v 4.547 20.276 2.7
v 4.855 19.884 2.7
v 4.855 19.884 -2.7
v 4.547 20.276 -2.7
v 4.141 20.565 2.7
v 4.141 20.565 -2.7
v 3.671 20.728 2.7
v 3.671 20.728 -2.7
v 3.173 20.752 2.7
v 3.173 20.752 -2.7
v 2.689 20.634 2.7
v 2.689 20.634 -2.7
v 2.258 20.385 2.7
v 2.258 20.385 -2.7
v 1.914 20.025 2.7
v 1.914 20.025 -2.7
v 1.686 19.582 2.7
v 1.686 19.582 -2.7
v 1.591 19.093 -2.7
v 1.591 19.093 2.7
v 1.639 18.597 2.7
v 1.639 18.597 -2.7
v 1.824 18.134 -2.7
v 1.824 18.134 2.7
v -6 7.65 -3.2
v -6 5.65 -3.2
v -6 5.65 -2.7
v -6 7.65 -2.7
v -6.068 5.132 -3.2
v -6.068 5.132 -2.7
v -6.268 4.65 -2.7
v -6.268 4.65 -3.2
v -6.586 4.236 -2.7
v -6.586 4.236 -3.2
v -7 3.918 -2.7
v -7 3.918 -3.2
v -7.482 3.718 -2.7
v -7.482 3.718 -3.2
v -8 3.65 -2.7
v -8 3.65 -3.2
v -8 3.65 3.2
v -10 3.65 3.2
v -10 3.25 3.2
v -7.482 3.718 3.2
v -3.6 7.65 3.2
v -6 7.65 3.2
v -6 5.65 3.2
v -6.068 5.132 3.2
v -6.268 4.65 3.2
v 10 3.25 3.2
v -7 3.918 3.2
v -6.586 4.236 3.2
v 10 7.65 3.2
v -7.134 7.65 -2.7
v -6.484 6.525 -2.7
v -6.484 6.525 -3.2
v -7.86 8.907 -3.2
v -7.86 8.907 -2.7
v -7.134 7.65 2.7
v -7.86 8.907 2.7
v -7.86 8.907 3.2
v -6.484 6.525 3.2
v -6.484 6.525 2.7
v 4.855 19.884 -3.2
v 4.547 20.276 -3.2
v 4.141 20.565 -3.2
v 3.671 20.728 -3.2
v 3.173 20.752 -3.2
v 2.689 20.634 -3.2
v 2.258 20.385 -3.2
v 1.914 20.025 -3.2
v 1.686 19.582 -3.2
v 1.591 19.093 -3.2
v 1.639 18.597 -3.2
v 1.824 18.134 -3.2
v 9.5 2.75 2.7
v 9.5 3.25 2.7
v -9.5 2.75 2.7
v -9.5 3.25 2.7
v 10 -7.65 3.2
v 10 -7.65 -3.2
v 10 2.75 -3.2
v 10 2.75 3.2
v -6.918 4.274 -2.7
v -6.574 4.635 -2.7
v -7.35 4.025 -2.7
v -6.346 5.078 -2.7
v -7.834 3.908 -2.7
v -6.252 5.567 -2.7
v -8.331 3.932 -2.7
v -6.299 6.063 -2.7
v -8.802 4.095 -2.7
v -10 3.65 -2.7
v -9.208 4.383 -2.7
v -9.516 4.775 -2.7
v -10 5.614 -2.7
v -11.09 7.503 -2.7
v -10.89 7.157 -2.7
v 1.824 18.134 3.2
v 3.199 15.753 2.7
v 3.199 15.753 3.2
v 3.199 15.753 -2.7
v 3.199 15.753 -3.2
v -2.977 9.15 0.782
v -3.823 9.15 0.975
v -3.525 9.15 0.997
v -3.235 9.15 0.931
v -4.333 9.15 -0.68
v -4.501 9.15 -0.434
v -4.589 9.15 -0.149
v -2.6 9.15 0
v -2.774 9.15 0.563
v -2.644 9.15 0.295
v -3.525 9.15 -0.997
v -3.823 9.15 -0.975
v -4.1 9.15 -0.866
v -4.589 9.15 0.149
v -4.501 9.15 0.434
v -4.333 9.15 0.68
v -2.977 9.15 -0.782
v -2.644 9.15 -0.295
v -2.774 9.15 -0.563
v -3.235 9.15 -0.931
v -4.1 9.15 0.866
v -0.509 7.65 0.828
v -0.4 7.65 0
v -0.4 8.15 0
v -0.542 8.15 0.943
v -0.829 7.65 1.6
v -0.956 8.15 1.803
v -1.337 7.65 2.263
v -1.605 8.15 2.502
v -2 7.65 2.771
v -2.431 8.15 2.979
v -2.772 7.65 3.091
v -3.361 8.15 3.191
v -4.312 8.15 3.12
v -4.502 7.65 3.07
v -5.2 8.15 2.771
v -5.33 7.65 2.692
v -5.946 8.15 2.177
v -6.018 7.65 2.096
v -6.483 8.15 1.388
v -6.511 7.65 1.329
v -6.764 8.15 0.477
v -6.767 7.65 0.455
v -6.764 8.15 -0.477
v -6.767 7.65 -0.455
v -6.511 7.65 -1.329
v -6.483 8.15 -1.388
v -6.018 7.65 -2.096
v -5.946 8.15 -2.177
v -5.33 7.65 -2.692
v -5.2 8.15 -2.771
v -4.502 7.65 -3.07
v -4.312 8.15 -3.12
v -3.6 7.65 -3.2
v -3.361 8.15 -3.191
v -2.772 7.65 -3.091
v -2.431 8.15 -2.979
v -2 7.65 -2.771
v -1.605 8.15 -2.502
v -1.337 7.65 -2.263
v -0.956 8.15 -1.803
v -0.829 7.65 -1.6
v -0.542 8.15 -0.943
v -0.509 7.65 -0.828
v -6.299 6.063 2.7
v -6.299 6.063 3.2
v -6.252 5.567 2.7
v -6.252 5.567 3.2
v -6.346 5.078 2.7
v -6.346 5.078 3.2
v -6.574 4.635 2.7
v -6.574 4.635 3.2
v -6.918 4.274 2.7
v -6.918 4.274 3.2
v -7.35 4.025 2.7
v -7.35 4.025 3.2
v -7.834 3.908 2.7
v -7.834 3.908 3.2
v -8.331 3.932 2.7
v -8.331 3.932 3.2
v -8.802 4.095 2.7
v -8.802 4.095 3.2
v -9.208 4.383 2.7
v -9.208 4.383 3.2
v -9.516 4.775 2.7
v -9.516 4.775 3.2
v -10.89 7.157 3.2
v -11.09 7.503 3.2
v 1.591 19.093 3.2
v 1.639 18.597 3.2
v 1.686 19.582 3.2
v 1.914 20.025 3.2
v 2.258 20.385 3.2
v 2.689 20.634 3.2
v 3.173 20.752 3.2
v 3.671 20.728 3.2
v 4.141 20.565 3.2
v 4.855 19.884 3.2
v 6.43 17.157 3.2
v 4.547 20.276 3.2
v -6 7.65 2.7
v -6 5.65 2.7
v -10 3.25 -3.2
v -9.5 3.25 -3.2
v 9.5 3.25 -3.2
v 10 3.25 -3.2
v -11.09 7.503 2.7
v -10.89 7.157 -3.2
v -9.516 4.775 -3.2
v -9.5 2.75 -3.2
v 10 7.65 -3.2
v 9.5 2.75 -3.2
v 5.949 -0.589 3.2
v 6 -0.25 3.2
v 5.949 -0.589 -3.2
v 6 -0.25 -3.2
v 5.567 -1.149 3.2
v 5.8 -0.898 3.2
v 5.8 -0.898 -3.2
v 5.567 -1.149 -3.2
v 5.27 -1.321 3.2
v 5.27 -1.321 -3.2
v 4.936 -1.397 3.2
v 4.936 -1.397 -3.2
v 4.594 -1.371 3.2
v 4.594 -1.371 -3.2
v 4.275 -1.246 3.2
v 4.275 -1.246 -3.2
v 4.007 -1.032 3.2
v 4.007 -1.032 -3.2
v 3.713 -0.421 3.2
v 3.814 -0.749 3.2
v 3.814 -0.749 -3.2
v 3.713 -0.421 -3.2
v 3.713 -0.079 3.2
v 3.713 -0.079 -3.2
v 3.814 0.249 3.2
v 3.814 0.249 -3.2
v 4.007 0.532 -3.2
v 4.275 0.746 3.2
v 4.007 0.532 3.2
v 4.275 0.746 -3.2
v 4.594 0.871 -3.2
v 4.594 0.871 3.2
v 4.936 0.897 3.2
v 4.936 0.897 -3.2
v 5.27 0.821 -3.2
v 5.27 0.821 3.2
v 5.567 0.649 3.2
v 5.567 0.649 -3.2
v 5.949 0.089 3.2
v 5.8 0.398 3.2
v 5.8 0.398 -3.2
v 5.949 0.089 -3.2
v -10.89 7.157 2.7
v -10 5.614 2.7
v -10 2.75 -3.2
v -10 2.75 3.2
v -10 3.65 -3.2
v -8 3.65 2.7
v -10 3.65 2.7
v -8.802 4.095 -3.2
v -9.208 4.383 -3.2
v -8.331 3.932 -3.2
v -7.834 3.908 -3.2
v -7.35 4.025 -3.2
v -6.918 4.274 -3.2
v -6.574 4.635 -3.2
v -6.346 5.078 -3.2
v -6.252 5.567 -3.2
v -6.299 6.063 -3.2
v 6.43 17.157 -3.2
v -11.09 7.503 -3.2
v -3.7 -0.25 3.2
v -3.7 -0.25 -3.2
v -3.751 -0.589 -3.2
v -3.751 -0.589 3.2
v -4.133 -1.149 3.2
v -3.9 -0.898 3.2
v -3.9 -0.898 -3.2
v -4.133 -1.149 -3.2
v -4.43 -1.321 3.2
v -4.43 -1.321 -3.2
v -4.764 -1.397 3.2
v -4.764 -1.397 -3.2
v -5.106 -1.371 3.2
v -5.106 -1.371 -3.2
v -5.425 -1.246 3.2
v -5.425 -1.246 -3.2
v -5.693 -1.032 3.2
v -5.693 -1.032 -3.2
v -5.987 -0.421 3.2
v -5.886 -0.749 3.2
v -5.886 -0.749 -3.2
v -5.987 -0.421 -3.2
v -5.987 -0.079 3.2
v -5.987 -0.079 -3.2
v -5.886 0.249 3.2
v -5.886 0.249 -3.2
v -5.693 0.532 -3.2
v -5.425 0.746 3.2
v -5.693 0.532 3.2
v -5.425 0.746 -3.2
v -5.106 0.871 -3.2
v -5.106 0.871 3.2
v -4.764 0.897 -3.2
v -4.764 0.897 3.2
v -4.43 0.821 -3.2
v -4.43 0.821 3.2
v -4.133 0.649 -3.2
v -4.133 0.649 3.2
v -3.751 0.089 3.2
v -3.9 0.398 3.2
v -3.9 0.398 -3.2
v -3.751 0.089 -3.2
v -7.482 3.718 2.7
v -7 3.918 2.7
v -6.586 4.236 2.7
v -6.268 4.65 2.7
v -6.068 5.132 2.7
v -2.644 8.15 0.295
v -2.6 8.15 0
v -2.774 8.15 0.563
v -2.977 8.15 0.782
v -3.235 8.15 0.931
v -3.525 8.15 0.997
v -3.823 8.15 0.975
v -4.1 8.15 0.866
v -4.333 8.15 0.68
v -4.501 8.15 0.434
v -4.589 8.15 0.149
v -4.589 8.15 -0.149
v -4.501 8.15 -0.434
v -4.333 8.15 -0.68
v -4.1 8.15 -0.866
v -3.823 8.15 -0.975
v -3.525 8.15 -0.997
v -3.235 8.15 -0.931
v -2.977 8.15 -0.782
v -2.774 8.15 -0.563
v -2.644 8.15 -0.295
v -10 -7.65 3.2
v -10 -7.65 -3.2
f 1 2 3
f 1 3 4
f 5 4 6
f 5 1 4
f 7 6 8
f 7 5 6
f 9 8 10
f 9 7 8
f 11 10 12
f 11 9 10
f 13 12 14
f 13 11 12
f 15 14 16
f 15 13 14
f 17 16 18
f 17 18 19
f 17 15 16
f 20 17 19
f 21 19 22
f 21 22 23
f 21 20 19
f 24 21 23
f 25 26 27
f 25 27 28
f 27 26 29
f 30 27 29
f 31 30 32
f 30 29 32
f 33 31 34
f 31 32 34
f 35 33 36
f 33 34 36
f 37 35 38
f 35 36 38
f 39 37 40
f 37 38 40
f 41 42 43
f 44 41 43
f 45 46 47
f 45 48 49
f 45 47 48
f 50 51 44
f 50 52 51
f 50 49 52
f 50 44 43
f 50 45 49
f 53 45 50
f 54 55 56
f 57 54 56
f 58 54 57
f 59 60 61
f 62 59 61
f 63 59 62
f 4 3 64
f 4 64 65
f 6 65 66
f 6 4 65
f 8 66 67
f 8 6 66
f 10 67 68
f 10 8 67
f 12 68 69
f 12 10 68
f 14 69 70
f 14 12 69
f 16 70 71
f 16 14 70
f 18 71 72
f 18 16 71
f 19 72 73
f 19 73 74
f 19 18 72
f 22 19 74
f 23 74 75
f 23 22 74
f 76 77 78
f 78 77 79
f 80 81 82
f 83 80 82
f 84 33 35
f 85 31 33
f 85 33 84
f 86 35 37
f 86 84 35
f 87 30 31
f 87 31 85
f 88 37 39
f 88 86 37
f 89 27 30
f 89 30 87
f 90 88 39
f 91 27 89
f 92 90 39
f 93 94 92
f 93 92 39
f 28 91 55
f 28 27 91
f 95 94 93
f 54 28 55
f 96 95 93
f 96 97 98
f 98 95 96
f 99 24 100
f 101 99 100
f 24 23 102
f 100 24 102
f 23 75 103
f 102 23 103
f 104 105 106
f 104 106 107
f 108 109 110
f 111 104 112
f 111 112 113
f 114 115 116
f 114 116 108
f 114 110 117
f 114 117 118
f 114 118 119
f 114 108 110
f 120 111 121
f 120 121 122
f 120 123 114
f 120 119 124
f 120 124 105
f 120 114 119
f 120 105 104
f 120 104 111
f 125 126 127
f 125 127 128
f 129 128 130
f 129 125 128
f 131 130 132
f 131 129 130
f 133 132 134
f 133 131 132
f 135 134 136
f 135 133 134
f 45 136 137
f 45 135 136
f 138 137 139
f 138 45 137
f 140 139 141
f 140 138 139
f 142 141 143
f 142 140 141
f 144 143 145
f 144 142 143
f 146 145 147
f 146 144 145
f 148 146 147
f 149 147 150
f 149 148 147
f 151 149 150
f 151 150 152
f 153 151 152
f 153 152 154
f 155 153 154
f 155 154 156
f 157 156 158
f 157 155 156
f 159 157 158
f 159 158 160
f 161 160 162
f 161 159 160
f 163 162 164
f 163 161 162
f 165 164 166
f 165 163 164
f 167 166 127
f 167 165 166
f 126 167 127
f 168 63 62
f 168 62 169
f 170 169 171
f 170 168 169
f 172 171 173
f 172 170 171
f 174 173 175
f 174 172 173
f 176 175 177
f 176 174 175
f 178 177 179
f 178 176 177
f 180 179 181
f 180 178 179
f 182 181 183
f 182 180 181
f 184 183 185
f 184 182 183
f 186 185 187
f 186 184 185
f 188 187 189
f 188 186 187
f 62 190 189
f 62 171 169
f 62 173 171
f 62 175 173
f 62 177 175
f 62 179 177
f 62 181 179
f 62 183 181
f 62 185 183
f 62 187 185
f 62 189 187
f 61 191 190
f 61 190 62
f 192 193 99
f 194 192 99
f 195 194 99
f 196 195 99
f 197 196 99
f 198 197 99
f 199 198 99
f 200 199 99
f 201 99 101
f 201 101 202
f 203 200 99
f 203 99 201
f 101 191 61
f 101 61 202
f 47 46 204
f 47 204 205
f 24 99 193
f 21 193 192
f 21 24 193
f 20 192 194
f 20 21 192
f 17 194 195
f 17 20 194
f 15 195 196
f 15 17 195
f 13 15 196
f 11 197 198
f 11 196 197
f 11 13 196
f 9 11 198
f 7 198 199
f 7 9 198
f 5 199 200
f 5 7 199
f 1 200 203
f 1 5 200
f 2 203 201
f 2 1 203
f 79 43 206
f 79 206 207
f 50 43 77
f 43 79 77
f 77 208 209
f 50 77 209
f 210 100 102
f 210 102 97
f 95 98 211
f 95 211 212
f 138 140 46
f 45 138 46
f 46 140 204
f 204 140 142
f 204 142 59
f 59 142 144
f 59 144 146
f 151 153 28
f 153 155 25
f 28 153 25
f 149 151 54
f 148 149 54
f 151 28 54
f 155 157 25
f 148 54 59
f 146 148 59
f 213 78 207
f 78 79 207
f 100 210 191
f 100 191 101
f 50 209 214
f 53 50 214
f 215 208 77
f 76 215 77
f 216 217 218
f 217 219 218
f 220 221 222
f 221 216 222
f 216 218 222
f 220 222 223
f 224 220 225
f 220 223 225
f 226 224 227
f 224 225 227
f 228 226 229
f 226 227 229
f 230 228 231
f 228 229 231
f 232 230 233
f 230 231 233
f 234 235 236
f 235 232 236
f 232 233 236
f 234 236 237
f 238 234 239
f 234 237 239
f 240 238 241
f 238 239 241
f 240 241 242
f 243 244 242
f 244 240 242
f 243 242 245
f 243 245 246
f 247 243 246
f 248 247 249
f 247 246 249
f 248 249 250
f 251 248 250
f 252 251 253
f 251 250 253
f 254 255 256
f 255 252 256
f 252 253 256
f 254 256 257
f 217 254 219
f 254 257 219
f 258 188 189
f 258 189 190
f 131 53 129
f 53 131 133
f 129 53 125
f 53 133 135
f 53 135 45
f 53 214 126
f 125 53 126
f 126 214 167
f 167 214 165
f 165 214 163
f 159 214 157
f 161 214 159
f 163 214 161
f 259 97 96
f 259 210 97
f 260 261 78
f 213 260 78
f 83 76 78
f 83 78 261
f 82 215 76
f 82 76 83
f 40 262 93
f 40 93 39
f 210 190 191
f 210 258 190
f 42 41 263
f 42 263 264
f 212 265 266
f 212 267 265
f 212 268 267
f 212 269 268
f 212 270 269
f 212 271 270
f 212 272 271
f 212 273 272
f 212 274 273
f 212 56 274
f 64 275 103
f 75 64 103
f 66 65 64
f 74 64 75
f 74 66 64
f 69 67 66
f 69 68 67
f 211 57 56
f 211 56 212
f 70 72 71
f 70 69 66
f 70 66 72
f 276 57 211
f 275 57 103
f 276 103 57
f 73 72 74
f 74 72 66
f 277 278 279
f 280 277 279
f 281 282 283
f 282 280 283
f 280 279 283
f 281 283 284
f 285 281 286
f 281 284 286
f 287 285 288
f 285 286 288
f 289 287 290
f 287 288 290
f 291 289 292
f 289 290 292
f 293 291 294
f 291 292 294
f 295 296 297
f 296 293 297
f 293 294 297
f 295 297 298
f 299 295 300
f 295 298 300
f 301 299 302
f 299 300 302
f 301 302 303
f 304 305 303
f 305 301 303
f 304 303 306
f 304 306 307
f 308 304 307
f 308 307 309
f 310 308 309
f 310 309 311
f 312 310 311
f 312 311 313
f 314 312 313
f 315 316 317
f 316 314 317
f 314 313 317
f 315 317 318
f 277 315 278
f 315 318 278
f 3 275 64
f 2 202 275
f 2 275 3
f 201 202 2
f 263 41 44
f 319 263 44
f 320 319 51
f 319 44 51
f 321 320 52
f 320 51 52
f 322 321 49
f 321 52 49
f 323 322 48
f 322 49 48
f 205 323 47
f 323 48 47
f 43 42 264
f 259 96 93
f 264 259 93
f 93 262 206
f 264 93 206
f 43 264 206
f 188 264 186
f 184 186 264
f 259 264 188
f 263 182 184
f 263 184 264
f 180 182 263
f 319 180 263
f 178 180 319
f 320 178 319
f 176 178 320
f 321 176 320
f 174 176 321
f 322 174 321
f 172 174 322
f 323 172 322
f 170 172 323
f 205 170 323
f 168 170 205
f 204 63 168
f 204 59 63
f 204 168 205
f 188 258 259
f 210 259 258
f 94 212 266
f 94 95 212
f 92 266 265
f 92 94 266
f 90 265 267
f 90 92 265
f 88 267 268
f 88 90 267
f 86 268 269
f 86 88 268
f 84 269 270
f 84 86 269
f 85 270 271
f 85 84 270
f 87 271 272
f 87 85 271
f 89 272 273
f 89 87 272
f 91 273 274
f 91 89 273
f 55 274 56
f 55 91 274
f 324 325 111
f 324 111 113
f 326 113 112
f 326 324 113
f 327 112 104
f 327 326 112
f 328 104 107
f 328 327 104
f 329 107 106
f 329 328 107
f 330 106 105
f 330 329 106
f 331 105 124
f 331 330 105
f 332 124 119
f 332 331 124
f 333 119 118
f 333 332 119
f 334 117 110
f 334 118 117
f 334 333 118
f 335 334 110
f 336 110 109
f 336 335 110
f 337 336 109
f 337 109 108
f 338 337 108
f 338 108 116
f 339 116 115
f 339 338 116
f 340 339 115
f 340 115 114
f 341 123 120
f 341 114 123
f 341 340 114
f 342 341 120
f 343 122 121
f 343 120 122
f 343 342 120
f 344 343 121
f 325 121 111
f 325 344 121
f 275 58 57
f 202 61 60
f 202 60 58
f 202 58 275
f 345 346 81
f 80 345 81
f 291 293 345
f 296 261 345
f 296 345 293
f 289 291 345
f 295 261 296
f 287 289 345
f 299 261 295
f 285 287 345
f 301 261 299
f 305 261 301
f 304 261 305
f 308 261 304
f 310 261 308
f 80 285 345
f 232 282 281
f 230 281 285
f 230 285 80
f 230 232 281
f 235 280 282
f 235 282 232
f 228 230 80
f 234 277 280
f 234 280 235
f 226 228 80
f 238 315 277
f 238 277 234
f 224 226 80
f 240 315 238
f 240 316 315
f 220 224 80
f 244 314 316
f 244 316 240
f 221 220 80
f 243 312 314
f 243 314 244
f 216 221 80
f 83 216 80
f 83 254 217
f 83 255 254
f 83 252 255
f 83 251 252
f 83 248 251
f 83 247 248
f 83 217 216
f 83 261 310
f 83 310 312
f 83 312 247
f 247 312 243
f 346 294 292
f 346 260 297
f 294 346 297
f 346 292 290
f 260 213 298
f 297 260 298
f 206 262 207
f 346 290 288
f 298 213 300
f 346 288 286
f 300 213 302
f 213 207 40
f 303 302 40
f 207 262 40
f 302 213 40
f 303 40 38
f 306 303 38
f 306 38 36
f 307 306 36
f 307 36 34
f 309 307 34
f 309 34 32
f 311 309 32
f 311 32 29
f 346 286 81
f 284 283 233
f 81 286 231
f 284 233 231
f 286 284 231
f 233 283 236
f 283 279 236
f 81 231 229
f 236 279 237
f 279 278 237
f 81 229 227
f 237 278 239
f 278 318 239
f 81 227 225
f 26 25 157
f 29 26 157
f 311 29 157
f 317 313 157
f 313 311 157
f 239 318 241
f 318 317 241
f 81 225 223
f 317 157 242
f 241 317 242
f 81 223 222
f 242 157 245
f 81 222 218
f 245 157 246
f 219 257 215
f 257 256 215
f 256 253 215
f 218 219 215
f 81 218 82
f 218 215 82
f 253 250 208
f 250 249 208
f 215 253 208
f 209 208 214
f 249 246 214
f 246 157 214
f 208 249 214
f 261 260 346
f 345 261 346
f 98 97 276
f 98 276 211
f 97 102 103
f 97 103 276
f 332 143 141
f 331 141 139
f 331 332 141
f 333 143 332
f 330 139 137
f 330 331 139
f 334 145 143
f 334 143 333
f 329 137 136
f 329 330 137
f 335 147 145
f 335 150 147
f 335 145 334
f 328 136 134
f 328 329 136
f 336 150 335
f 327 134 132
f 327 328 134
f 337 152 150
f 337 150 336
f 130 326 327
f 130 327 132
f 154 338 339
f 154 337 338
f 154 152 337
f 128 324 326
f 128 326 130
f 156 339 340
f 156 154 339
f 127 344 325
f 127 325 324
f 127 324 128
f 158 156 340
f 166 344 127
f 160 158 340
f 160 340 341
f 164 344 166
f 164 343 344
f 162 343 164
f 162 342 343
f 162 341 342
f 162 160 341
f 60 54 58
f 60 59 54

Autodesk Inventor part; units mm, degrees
ref_plane "YZ Plane" through (0, 0, 0) normal (1, 0, 0) x (0, 1, 0)
ref_plane "XZ Plane" through (0, 0, 0) normal (0, 1, 0) x (-1, 0, 0)
sketch "LimitSwitchBody" plane through (0, 0, 0) normal (0, 0, 1) x (1, 0, 0)
  line L0 (-10, -7.65) -> (10, -7.65)
  line L1 (10, -7.65) -> (10, 7.65)
  line L2 (10, 7.65) -> (-10, 7.65)
  line L3 (-10, 7.65) -> (-10, -7.65)
  line L4 (-10, -7.65) -> (10, 7.65) construction
  line L5 (10, -7.65) -> (-10, 7.65) construction
  line L6 (-10, -0.25) -> (10, -0.25) construction
  circle A0 centre (4.85, -0.25) radius 1.15
  line L7 (3.7, -1.4) -> (6, -1.4) construction
  line L8 (6, -1.4) -> (6, 0.9) construction
  line L9 (6, 0.9) -> (3.7, 0.9) construction
  line L10 (3.7, 0.9) -> (3.7, -1.4) construction
  line L11 (3.7, -1.4) -> (6, 0.9) construction
  line L12 (6, -1.4) -> (3.7, 0.9) construction
  line L13 (0, -10.71) -> (0, 10.71) construction
  circle A1 centre (-4.85, -0.25) radius 1.15
  point P0 (0, 0)
  dimension "d0" = 20
  dimension "d1" = 15.3
  dimension "d2" = 2.3
  dimension "d3" = 4
  dimension "d4" = 7.4
extrude "LimitSwitchBodyFeature" add sketch "LimitSwitchBody" along normal mid plane 6.4
ref_plane "EtchPlane" through (-10, 3.25, -3.2) normal (0, 1, 0) x (1, 0, 0)
sketch "EtchProfile" plane through (-10, 3.25, -3.2) normal (0, 1, 0) x (1, 0, 0)
  line L0 (0, 0) -> (20, 0) projected
  line L1 (0, 0) -> (0, -6.4) projected
  line L2 (20, -6.4) -> (0, -6.4) projected
  line L3 (20, 0) -> (20, -6.4) projected
  line L4 (0.5, -5.9) -> (0.5, 0.5)
  line L5 (0.5, 0.5) -> (19.5, 0.5)
  line L6 (19.5, 0.5) -> (19.5, -5.9)
  line L7 (19.5, -5.9) -> (0.5, -5.9)
  point P0 (10, -3.2)
  dimension "d8" = 0.5
extrude "EtchFeature" cut sketch "EtchProfile" against normal blind 0.5 contours L0 L4 L7 L6 L3 L2 L1
sketch "HingeIndent" plane through (0, 0, 3.2) normal (0, 0, 1) x (1, 0, 0)
  line L0 (-10, 7.65) -> (-10, 3.25) projected
  line L1 (-10, 7.65) -> (-6, 7.65)
  line L2 (-6, 7.65) -> (-6, 3.65)
  line L3 (-6, 3.65) -> (-10, 3.65)
  line L4 (-10, 3.65) -> (-10, 7.65)
  circle A0 centre (-8, 5.65) radius 2
  point P0 (0, 0)
  point P1 (-8, 3.65)
  point P2 (-6, 5.65)
  dimension "d11" = 4
extrude "HingeIndentFeature" cut sketch "HingeIndent" against normal blind 0.5 contours L1 A0 L0 | A0 L3 L0 | A0 | L1 L2 A0
mirror "HingeMirrorFeature" about plane through (0, 0, 0) normal (0, 0, 1) of "HingeIndentFeature"
sketch "ButtonHousing" plane through (10, 7.65, 3.2) normal (0, 1, 0) x (1, 0, 0)
  line L0 (-24, 3.2) -> (4, 3.2) construction
  line L1 (-20, 5.9) -> (-20, 0.5) construction
  circle A0 centre (-13.6, 3.2) radius 3.2
  line L2 (0, 0) -> (-16, 0) projected
  point P0 (-10, 3.2)
  dimension "d14" = 6.4
extrude "ButtonHousingFeature" add sketch "ButtonHousing" along normal blind 0.5
sketch "Button" plane through (-3.6, 8.15, 0) normal (0, 1, 0) x (1, 0, 0)
  circle A0 centre (0, 0) radius 3.2 construction
  circle A1 centre (0, 0) radius 1
  point P0 (3.6, 0)
  dimension "d17" = 2
extrude "ButtonFeature" add sketch "Button" along normal blind 1
sketch "Lever" plane through (0, 0, 2.7) normal (0, 0, 1) x (1, 0, 0)
  arc A0 (-8, 3.65) -> (-6, 5.65) centre (-8, 5.65) ccw projected
  circle A1 centre (-8, 5.65) radius 1.75
  line L0 (-9.5155, 4.775) -> (-10.8905, 7.1566)
  line L1 (-10.8905, 7.1566) -> (-7.8595, 8.9066)
  line L2 (-7.8595, 8.9066) -> (-6.4845, 6.525)
  line L3 (-9.375, 8.0316) -> (-8, 5.65) construction
  line L4 (-10, 3.25) -> (10, 3.25) projected
  line L5 (-7.8595, 8.9066) -> (6.43, 17.1566)
  line L6 (-10.8905, 7.1566) -> (-11.0905, 7.503)
  line L7 (-11.0905, 7.503) -> (6.23, 17.503)
  line L8 (6.23, 17.503) -> (6.43, 17.1566)
  line L9 (-2.4303, 12.503) -> (-2.2303, 12.1566) construction
  circle A2 centre (3.3394, 19.0095) radius 1.75
  line L10 (6.23, 17.503) -> (4.855, 19.8845)
  line L11 (1.8239, 18.1345) -> (3.1989, 15.753)
  point P0 (0, 0)
  dimension "d20" = 0.25
  dimension "d21" = 2.75
  dimension "d22" = 3.5
  dimension "d23" = 120
  dimension "d24" = 20
  dimension "d25" = 0.4
extrude "LeverFeature" add sketch "Lever" along normal up to surface (0.5 mm away)
mirror "LeverMirrorFeature" about plane through (0, 0, 0) normal (0, 0, 1) of "LeverFeature"
sketch "LeverConnect" plane through (0, 0, 2.7) normal (0, 0, -1) x (-1, 0, 0)
  line L0 (10, 5.6141) -> (10, 7.65) projected
  line L1 (11.0905, 7.503) -> (10, 5.6141) projected
  line L2 (-3.1989, 15.753) -> (11.0905, 7.503) projected
  line L3 (-1.8239, 18.1345) -> (-3.1989, 15.753) projected
  arc A0 (-1.8239, 18.1345) -> (-4.855, 19.8845) centre (-3.3394, 19.0095) ccw projected
  line L4 (-6.43, 17.1566) -> (-4.855, 19.8845) projected
  line L5 (7.8595, 8.9066) -> (-6.43, 17.1566) projected
  line L6 (7.134, 7.65) -> (7.8595, 8.9066) projected
  line L7 (10, 7.65) -> (7.134, 7.65) projected
  point P0 (0, 0)
extrude "LeverConnectFeature" add sketch "LeverConnect" along normal up to surface (5.4 mm away)
equation "\"d26\" = d25"
properties part number "ArmLimitSwitch"
